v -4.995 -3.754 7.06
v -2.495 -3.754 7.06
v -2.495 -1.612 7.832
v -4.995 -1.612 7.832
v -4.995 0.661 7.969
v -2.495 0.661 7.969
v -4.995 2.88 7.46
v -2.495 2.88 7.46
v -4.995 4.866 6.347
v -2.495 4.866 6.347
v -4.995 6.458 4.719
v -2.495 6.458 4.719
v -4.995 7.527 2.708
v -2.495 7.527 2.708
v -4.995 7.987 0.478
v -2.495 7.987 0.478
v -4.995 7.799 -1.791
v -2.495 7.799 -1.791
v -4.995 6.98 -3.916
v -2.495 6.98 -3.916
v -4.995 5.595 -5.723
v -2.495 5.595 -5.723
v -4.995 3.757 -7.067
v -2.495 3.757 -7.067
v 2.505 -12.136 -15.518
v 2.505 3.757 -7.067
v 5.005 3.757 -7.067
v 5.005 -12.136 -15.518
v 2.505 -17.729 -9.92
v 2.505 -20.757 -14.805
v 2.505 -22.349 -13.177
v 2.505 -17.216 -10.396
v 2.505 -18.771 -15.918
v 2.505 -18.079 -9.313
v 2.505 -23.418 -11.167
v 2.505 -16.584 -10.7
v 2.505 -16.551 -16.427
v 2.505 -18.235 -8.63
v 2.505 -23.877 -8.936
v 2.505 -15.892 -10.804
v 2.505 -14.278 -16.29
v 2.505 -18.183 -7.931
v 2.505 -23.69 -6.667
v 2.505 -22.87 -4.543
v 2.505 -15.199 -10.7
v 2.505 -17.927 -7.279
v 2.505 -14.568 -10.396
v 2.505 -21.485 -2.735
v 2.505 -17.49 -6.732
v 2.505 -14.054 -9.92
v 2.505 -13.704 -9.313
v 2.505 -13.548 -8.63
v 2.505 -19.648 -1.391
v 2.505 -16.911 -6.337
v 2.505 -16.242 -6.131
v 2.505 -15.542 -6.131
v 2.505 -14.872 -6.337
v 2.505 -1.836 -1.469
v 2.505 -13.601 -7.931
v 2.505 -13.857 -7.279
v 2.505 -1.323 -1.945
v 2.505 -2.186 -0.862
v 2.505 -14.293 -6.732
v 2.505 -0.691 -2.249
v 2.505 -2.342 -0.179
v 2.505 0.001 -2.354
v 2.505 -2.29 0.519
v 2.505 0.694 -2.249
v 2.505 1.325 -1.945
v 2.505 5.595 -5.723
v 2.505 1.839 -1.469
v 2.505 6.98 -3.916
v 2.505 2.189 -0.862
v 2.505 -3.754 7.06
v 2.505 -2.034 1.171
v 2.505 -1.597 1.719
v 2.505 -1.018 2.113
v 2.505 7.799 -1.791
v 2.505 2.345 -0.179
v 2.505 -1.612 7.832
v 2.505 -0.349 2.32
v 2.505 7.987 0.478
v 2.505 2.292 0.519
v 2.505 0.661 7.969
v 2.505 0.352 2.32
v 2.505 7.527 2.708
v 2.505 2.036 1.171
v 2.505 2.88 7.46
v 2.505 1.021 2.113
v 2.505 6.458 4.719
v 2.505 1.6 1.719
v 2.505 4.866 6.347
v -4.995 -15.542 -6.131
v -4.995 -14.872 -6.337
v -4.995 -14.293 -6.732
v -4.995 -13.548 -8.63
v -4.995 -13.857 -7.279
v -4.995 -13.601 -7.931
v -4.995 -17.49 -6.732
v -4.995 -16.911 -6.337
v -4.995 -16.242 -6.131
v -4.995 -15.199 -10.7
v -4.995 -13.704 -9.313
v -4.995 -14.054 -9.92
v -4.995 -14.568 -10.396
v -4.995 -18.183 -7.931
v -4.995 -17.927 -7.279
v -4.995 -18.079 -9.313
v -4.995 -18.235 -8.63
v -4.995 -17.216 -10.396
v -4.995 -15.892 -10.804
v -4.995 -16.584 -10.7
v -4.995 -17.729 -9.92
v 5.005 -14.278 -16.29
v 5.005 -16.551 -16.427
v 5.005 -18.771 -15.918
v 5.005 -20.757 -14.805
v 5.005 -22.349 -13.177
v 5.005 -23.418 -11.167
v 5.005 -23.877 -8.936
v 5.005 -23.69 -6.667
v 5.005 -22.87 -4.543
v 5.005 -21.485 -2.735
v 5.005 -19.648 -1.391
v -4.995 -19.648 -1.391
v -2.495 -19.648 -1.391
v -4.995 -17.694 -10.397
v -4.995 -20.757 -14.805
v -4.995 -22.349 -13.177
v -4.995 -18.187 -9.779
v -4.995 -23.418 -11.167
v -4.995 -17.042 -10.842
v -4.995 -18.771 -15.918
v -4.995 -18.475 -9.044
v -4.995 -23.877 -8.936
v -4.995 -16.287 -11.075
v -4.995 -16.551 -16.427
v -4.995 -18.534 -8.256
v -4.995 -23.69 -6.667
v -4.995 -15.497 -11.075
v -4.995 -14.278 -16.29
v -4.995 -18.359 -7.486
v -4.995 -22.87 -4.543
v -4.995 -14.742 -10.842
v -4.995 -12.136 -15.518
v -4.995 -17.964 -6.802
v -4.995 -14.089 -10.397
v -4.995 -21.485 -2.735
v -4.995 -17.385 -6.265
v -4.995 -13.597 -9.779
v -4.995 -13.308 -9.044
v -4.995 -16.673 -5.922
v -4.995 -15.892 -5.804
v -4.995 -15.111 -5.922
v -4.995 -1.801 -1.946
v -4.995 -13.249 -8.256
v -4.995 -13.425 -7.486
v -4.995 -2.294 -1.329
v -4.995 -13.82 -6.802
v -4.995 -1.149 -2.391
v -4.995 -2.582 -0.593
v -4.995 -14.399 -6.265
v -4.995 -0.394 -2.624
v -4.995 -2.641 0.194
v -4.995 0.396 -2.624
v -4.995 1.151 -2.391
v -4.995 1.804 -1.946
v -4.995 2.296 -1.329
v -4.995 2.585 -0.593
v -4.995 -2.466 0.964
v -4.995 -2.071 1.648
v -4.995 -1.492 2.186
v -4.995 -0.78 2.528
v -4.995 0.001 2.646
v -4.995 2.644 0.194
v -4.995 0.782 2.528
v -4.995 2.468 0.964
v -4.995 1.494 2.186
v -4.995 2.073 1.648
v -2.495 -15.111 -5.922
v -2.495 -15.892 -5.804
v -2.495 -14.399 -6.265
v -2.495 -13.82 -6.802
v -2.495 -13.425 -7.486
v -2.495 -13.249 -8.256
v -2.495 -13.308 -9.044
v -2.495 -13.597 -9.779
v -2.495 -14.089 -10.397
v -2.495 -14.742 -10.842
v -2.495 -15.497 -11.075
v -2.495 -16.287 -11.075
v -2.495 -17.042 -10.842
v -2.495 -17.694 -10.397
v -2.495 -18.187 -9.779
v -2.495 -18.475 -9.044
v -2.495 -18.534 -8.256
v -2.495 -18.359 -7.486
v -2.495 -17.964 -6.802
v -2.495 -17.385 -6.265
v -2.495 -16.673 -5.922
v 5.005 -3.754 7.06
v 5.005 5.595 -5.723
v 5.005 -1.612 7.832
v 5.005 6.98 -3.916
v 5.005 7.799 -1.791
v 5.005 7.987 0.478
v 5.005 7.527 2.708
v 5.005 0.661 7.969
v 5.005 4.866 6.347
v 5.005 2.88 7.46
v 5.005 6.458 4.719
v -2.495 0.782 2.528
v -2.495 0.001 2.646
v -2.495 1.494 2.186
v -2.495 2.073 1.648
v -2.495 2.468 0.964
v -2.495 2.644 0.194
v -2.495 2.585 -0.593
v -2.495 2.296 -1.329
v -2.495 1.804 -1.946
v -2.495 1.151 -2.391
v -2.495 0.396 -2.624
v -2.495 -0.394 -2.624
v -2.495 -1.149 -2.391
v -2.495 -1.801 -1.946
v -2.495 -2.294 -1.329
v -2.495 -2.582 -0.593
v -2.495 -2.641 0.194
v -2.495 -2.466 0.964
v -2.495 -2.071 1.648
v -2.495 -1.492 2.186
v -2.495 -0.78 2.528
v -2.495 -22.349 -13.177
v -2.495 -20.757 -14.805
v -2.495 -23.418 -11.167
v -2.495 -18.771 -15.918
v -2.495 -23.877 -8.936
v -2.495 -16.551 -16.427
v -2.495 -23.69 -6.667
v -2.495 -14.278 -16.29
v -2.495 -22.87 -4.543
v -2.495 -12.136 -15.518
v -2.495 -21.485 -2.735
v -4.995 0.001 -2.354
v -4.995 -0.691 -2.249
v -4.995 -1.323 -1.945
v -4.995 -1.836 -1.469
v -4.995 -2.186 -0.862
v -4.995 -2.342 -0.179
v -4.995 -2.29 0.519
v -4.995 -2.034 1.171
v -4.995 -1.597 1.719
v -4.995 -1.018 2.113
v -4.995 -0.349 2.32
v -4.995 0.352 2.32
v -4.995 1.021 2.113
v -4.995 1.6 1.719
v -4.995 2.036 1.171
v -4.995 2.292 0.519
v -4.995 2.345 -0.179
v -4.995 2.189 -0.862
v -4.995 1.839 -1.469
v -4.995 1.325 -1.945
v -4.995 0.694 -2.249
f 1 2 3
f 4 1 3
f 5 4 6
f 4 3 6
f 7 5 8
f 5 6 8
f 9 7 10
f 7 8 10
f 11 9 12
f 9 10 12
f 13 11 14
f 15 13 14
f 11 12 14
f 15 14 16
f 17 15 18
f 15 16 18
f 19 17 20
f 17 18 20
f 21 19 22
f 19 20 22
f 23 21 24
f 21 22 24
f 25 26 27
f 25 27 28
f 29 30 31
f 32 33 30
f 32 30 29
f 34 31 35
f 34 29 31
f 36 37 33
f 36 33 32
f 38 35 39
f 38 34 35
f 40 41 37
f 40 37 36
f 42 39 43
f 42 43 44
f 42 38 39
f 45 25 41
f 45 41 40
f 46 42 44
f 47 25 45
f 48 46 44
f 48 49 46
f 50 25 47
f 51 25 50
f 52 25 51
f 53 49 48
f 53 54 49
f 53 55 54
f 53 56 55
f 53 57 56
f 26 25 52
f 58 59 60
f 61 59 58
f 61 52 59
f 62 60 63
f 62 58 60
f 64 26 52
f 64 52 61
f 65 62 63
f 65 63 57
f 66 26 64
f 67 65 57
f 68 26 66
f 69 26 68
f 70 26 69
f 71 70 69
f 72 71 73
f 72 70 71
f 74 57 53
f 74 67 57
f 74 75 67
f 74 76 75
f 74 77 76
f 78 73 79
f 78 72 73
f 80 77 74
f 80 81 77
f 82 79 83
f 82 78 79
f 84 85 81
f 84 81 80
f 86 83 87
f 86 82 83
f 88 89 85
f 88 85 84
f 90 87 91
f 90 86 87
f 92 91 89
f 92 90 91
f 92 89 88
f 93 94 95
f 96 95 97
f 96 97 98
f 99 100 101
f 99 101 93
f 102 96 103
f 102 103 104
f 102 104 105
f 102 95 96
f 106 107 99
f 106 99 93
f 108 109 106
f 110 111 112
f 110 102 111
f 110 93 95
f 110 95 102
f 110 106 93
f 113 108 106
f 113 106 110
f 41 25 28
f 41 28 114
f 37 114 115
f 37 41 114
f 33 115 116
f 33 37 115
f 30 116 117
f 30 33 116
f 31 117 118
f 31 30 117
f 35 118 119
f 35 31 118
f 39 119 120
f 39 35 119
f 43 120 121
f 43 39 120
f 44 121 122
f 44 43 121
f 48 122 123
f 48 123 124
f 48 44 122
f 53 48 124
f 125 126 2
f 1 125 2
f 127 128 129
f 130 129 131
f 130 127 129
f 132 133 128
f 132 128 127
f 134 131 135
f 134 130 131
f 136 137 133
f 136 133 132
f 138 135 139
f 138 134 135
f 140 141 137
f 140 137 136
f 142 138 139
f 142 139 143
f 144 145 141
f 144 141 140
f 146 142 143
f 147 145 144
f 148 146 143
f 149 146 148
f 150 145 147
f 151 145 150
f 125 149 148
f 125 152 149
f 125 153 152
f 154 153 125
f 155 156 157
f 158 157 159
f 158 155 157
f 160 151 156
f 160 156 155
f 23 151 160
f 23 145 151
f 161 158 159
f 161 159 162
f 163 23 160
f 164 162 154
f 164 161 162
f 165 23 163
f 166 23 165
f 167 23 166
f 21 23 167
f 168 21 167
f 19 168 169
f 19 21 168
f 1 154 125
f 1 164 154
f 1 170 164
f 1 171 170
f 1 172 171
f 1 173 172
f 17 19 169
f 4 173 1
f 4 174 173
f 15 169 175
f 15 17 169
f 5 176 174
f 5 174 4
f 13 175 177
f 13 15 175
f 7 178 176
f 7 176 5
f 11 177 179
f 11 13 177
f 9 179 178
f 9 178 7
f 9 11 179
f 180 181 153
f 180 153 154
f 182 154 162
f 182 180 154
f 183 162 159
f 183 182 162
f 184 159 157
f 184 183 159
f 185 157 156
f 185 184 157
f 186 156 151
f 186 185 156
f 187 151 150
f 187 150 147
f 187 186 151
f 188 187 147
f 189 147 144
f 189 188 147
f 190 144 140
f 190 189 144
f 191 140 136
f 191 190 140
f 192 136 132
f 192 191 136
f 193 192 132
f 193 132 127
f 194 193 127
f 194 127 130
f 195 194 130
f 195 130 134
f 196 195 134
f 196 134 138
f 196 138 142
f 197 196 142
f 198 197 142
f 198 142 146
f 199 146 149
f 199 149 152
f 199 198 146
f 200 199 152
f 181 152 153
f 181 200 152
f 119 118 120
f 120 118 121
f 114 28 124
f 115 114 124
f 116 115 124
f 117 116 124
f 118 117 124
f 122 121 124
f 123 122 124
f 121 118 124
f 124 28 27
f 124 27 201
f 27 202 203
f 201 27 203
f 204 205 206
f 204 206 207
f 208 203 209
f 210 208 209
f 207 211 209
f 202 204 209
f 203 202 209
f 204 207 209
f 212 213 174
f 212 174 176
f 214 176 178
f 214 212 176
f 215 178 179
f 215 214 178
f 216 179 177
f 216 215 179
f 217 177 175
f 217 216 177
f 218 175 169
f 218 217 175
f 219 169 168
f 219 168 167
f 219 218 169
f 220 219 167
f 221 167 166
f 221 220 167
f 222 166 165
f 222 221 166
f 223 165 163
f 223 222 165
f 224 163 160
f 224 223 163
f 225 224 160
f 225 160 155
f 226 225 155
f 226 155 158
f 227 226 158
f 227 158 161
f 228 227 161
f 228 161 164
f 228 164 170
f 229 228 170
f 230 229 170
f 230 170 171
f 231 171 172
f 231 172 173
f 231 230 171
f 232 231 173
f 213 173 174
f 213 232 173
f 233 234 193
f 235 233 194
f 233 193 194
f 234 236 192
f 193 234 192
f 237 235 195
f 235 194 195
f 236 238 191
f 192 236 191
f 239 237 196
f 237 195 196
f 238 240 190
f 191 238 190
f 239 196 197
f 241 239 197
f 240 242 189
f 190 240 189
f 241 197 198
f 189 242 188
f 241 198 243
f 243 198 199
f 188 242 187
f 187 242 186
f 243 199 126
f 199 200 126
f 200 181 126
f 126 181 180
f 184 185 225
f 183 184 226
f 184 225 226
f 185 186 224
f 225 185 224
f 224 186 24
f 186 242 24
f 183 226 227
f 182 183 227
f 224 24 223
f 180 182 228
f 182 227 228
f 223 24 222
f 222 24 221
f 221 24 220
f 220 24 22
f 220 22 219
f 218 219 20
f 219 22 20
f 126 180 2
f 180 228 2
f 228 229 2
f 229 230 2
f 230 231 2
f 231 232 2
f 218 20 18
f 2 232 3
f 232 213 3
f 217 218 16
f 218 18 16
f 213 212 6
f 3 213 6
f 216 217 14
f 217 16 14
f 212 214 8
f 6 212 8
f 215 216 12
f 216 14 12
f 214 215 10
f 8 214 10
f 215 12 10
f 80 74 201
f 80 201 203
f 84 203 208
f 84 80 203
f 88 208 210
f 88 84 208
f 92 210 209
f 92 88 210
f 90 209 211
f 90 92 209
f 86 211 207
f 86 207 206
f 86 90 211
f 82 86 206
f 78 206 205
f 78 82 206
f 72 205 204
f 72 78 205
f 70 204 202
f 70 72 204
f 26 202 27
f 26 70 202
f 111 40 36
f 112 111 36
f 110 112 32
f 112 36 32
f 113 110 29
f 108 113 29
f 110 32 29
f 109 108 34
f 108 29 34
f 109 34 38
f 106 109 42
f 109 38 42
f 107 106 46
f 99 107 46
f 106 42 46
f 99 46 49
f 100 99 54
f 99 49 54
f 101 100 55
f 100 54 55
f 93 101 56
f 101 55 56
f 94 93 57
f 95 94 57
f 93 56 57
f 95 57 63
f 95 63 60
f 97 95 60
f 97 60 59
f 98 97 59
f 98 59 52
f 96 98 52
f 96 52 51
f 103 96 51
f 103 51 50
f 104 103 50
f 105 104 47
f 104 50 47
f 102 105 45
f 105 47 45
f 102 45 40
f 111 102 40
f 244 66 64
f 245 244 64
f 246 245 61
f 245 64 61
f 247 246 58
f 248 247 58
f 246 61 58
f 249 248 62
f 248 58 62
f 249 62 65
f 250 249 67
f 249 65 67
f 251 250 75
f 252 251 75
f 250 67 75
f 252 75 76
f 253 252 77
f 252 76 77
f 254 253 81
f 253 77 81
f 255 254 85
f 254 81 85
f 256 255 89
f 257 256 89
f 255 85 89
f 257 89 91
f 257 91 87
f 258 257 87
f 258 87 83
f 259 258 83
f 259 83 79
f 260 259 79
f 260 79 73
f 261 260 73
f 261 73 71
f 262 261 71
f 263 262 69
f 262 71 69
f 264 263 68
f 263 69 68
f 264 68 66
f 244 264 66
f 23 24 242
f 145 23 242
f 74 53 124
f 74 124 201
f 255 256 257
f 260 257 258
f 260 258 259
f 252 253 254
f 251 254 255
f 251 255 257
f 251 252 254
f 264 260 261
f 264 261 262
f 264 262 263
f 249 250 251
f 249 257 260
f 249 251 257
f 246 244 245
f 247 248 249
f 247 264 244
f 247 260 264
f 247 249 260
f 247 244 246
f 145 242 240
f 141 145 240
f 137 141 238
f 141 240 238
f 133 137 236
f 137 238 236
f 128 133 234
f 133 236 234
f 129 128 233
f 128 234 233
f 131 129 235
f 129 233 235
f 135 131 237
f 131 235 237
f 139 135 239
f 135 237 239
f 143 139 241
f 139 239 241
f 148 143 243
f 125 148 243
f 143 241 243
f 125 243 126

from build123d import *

# Parameters (mm, degrees)
BOSS_EXTRUDE1_DEPTH = 2.5
SKETCH2_R           = 2.35
BOSS_EXTRUDE2_DEPTH = 7.5
SKETCH3_R           = 2.65
BOSS_EXTRUDE3_DEPTH = 2.5


with BuildPart() as part:
    # Sketch1 → Boss-Extrude1 (new body)
    with BuildSketch(Plane(origin=(23.504809472, 0, 0), x_dir=(0, 0, -1), z_dir=(1, 0, 0))):
        with BuildLine():
            Line((-1.032603934, 120.437046334), (7.417884196, 104.543989663))
            ThreePointArc((7.417884196, 104.543989663), (4.110075956, 93.724636418), (-6.709277289, 97.032444658))
            Line((-6.709277289, 97.032444658), (-15.15976542, 112.92550133))
            ThreePointArc((-15.15976542, 112.92550133), (-11.851957179, 123.744854575), (-1.032603934, 120.437046334))
        make_face()
    extrude(amount=BOSS_EXTRUDE1_DEPTH)

    # Sketch2 → Boss-Extrude2 (add)
    with BuildSketch(Plane.ZY.offset(-23.504809472)):
        with Locations(Location((8.096184677, 116.681273832, 0), (0, 0, 180))):
            Circle(SKETCH2_R)
        with Locations(Location((-0.354303453, 100.78821716, 0), (0, 0, 180))):
            Circle(SKETCH2_R)
    extrude(amount=BOSS_EXTRUDE2_DEPTH)


with BuildPart() as body_2:
    # Sketch3 → Boss-Extrude3 (new body)
    with BuildSketch(Plane.ZY.offset(-18.504809472)):
        with BuildLine():
            Line((1.032603934, 120.437046334), (-7.417884196, 104.543989663))
            ThreePointArc((-7.417884196, 104.543989663), (-4.110075956, 93.724636418), (6.709277289, 97.032444658))
            Line((6.709277289, 97.032444658), (15.15976542, 112.92550133))
            ThreePointArc((15.15976542, 112.92550133), (11.851957179, 123.744854575), (1.032603934, 120.437046334))
        make_face()
        with Locations((8.096184677, 116.681273832)):
            Circle(SKETCH3_R, mode=Mode.SUBTRACT)
        with Locations((-0.354303453, 100.78821716)):
            Circle(SKETCH3_R, mode=Mode.SUBTRACT)
    extrude(amount=BOSS_EXTRUDE3_DEPTH)


with BuildPart() as part_1:
    # Body-Move/Copy1: moved
    add(part.part.moved(Location((-21, -116.68, -8.1))))


with BuildPart() as body_2_1:
    # Body-Move/Copy1: moved
    add(body_2.part.moved(Location((-21, -116.68, -8.1))))


solid = Compound([part_1.part, body_2_1.part])
